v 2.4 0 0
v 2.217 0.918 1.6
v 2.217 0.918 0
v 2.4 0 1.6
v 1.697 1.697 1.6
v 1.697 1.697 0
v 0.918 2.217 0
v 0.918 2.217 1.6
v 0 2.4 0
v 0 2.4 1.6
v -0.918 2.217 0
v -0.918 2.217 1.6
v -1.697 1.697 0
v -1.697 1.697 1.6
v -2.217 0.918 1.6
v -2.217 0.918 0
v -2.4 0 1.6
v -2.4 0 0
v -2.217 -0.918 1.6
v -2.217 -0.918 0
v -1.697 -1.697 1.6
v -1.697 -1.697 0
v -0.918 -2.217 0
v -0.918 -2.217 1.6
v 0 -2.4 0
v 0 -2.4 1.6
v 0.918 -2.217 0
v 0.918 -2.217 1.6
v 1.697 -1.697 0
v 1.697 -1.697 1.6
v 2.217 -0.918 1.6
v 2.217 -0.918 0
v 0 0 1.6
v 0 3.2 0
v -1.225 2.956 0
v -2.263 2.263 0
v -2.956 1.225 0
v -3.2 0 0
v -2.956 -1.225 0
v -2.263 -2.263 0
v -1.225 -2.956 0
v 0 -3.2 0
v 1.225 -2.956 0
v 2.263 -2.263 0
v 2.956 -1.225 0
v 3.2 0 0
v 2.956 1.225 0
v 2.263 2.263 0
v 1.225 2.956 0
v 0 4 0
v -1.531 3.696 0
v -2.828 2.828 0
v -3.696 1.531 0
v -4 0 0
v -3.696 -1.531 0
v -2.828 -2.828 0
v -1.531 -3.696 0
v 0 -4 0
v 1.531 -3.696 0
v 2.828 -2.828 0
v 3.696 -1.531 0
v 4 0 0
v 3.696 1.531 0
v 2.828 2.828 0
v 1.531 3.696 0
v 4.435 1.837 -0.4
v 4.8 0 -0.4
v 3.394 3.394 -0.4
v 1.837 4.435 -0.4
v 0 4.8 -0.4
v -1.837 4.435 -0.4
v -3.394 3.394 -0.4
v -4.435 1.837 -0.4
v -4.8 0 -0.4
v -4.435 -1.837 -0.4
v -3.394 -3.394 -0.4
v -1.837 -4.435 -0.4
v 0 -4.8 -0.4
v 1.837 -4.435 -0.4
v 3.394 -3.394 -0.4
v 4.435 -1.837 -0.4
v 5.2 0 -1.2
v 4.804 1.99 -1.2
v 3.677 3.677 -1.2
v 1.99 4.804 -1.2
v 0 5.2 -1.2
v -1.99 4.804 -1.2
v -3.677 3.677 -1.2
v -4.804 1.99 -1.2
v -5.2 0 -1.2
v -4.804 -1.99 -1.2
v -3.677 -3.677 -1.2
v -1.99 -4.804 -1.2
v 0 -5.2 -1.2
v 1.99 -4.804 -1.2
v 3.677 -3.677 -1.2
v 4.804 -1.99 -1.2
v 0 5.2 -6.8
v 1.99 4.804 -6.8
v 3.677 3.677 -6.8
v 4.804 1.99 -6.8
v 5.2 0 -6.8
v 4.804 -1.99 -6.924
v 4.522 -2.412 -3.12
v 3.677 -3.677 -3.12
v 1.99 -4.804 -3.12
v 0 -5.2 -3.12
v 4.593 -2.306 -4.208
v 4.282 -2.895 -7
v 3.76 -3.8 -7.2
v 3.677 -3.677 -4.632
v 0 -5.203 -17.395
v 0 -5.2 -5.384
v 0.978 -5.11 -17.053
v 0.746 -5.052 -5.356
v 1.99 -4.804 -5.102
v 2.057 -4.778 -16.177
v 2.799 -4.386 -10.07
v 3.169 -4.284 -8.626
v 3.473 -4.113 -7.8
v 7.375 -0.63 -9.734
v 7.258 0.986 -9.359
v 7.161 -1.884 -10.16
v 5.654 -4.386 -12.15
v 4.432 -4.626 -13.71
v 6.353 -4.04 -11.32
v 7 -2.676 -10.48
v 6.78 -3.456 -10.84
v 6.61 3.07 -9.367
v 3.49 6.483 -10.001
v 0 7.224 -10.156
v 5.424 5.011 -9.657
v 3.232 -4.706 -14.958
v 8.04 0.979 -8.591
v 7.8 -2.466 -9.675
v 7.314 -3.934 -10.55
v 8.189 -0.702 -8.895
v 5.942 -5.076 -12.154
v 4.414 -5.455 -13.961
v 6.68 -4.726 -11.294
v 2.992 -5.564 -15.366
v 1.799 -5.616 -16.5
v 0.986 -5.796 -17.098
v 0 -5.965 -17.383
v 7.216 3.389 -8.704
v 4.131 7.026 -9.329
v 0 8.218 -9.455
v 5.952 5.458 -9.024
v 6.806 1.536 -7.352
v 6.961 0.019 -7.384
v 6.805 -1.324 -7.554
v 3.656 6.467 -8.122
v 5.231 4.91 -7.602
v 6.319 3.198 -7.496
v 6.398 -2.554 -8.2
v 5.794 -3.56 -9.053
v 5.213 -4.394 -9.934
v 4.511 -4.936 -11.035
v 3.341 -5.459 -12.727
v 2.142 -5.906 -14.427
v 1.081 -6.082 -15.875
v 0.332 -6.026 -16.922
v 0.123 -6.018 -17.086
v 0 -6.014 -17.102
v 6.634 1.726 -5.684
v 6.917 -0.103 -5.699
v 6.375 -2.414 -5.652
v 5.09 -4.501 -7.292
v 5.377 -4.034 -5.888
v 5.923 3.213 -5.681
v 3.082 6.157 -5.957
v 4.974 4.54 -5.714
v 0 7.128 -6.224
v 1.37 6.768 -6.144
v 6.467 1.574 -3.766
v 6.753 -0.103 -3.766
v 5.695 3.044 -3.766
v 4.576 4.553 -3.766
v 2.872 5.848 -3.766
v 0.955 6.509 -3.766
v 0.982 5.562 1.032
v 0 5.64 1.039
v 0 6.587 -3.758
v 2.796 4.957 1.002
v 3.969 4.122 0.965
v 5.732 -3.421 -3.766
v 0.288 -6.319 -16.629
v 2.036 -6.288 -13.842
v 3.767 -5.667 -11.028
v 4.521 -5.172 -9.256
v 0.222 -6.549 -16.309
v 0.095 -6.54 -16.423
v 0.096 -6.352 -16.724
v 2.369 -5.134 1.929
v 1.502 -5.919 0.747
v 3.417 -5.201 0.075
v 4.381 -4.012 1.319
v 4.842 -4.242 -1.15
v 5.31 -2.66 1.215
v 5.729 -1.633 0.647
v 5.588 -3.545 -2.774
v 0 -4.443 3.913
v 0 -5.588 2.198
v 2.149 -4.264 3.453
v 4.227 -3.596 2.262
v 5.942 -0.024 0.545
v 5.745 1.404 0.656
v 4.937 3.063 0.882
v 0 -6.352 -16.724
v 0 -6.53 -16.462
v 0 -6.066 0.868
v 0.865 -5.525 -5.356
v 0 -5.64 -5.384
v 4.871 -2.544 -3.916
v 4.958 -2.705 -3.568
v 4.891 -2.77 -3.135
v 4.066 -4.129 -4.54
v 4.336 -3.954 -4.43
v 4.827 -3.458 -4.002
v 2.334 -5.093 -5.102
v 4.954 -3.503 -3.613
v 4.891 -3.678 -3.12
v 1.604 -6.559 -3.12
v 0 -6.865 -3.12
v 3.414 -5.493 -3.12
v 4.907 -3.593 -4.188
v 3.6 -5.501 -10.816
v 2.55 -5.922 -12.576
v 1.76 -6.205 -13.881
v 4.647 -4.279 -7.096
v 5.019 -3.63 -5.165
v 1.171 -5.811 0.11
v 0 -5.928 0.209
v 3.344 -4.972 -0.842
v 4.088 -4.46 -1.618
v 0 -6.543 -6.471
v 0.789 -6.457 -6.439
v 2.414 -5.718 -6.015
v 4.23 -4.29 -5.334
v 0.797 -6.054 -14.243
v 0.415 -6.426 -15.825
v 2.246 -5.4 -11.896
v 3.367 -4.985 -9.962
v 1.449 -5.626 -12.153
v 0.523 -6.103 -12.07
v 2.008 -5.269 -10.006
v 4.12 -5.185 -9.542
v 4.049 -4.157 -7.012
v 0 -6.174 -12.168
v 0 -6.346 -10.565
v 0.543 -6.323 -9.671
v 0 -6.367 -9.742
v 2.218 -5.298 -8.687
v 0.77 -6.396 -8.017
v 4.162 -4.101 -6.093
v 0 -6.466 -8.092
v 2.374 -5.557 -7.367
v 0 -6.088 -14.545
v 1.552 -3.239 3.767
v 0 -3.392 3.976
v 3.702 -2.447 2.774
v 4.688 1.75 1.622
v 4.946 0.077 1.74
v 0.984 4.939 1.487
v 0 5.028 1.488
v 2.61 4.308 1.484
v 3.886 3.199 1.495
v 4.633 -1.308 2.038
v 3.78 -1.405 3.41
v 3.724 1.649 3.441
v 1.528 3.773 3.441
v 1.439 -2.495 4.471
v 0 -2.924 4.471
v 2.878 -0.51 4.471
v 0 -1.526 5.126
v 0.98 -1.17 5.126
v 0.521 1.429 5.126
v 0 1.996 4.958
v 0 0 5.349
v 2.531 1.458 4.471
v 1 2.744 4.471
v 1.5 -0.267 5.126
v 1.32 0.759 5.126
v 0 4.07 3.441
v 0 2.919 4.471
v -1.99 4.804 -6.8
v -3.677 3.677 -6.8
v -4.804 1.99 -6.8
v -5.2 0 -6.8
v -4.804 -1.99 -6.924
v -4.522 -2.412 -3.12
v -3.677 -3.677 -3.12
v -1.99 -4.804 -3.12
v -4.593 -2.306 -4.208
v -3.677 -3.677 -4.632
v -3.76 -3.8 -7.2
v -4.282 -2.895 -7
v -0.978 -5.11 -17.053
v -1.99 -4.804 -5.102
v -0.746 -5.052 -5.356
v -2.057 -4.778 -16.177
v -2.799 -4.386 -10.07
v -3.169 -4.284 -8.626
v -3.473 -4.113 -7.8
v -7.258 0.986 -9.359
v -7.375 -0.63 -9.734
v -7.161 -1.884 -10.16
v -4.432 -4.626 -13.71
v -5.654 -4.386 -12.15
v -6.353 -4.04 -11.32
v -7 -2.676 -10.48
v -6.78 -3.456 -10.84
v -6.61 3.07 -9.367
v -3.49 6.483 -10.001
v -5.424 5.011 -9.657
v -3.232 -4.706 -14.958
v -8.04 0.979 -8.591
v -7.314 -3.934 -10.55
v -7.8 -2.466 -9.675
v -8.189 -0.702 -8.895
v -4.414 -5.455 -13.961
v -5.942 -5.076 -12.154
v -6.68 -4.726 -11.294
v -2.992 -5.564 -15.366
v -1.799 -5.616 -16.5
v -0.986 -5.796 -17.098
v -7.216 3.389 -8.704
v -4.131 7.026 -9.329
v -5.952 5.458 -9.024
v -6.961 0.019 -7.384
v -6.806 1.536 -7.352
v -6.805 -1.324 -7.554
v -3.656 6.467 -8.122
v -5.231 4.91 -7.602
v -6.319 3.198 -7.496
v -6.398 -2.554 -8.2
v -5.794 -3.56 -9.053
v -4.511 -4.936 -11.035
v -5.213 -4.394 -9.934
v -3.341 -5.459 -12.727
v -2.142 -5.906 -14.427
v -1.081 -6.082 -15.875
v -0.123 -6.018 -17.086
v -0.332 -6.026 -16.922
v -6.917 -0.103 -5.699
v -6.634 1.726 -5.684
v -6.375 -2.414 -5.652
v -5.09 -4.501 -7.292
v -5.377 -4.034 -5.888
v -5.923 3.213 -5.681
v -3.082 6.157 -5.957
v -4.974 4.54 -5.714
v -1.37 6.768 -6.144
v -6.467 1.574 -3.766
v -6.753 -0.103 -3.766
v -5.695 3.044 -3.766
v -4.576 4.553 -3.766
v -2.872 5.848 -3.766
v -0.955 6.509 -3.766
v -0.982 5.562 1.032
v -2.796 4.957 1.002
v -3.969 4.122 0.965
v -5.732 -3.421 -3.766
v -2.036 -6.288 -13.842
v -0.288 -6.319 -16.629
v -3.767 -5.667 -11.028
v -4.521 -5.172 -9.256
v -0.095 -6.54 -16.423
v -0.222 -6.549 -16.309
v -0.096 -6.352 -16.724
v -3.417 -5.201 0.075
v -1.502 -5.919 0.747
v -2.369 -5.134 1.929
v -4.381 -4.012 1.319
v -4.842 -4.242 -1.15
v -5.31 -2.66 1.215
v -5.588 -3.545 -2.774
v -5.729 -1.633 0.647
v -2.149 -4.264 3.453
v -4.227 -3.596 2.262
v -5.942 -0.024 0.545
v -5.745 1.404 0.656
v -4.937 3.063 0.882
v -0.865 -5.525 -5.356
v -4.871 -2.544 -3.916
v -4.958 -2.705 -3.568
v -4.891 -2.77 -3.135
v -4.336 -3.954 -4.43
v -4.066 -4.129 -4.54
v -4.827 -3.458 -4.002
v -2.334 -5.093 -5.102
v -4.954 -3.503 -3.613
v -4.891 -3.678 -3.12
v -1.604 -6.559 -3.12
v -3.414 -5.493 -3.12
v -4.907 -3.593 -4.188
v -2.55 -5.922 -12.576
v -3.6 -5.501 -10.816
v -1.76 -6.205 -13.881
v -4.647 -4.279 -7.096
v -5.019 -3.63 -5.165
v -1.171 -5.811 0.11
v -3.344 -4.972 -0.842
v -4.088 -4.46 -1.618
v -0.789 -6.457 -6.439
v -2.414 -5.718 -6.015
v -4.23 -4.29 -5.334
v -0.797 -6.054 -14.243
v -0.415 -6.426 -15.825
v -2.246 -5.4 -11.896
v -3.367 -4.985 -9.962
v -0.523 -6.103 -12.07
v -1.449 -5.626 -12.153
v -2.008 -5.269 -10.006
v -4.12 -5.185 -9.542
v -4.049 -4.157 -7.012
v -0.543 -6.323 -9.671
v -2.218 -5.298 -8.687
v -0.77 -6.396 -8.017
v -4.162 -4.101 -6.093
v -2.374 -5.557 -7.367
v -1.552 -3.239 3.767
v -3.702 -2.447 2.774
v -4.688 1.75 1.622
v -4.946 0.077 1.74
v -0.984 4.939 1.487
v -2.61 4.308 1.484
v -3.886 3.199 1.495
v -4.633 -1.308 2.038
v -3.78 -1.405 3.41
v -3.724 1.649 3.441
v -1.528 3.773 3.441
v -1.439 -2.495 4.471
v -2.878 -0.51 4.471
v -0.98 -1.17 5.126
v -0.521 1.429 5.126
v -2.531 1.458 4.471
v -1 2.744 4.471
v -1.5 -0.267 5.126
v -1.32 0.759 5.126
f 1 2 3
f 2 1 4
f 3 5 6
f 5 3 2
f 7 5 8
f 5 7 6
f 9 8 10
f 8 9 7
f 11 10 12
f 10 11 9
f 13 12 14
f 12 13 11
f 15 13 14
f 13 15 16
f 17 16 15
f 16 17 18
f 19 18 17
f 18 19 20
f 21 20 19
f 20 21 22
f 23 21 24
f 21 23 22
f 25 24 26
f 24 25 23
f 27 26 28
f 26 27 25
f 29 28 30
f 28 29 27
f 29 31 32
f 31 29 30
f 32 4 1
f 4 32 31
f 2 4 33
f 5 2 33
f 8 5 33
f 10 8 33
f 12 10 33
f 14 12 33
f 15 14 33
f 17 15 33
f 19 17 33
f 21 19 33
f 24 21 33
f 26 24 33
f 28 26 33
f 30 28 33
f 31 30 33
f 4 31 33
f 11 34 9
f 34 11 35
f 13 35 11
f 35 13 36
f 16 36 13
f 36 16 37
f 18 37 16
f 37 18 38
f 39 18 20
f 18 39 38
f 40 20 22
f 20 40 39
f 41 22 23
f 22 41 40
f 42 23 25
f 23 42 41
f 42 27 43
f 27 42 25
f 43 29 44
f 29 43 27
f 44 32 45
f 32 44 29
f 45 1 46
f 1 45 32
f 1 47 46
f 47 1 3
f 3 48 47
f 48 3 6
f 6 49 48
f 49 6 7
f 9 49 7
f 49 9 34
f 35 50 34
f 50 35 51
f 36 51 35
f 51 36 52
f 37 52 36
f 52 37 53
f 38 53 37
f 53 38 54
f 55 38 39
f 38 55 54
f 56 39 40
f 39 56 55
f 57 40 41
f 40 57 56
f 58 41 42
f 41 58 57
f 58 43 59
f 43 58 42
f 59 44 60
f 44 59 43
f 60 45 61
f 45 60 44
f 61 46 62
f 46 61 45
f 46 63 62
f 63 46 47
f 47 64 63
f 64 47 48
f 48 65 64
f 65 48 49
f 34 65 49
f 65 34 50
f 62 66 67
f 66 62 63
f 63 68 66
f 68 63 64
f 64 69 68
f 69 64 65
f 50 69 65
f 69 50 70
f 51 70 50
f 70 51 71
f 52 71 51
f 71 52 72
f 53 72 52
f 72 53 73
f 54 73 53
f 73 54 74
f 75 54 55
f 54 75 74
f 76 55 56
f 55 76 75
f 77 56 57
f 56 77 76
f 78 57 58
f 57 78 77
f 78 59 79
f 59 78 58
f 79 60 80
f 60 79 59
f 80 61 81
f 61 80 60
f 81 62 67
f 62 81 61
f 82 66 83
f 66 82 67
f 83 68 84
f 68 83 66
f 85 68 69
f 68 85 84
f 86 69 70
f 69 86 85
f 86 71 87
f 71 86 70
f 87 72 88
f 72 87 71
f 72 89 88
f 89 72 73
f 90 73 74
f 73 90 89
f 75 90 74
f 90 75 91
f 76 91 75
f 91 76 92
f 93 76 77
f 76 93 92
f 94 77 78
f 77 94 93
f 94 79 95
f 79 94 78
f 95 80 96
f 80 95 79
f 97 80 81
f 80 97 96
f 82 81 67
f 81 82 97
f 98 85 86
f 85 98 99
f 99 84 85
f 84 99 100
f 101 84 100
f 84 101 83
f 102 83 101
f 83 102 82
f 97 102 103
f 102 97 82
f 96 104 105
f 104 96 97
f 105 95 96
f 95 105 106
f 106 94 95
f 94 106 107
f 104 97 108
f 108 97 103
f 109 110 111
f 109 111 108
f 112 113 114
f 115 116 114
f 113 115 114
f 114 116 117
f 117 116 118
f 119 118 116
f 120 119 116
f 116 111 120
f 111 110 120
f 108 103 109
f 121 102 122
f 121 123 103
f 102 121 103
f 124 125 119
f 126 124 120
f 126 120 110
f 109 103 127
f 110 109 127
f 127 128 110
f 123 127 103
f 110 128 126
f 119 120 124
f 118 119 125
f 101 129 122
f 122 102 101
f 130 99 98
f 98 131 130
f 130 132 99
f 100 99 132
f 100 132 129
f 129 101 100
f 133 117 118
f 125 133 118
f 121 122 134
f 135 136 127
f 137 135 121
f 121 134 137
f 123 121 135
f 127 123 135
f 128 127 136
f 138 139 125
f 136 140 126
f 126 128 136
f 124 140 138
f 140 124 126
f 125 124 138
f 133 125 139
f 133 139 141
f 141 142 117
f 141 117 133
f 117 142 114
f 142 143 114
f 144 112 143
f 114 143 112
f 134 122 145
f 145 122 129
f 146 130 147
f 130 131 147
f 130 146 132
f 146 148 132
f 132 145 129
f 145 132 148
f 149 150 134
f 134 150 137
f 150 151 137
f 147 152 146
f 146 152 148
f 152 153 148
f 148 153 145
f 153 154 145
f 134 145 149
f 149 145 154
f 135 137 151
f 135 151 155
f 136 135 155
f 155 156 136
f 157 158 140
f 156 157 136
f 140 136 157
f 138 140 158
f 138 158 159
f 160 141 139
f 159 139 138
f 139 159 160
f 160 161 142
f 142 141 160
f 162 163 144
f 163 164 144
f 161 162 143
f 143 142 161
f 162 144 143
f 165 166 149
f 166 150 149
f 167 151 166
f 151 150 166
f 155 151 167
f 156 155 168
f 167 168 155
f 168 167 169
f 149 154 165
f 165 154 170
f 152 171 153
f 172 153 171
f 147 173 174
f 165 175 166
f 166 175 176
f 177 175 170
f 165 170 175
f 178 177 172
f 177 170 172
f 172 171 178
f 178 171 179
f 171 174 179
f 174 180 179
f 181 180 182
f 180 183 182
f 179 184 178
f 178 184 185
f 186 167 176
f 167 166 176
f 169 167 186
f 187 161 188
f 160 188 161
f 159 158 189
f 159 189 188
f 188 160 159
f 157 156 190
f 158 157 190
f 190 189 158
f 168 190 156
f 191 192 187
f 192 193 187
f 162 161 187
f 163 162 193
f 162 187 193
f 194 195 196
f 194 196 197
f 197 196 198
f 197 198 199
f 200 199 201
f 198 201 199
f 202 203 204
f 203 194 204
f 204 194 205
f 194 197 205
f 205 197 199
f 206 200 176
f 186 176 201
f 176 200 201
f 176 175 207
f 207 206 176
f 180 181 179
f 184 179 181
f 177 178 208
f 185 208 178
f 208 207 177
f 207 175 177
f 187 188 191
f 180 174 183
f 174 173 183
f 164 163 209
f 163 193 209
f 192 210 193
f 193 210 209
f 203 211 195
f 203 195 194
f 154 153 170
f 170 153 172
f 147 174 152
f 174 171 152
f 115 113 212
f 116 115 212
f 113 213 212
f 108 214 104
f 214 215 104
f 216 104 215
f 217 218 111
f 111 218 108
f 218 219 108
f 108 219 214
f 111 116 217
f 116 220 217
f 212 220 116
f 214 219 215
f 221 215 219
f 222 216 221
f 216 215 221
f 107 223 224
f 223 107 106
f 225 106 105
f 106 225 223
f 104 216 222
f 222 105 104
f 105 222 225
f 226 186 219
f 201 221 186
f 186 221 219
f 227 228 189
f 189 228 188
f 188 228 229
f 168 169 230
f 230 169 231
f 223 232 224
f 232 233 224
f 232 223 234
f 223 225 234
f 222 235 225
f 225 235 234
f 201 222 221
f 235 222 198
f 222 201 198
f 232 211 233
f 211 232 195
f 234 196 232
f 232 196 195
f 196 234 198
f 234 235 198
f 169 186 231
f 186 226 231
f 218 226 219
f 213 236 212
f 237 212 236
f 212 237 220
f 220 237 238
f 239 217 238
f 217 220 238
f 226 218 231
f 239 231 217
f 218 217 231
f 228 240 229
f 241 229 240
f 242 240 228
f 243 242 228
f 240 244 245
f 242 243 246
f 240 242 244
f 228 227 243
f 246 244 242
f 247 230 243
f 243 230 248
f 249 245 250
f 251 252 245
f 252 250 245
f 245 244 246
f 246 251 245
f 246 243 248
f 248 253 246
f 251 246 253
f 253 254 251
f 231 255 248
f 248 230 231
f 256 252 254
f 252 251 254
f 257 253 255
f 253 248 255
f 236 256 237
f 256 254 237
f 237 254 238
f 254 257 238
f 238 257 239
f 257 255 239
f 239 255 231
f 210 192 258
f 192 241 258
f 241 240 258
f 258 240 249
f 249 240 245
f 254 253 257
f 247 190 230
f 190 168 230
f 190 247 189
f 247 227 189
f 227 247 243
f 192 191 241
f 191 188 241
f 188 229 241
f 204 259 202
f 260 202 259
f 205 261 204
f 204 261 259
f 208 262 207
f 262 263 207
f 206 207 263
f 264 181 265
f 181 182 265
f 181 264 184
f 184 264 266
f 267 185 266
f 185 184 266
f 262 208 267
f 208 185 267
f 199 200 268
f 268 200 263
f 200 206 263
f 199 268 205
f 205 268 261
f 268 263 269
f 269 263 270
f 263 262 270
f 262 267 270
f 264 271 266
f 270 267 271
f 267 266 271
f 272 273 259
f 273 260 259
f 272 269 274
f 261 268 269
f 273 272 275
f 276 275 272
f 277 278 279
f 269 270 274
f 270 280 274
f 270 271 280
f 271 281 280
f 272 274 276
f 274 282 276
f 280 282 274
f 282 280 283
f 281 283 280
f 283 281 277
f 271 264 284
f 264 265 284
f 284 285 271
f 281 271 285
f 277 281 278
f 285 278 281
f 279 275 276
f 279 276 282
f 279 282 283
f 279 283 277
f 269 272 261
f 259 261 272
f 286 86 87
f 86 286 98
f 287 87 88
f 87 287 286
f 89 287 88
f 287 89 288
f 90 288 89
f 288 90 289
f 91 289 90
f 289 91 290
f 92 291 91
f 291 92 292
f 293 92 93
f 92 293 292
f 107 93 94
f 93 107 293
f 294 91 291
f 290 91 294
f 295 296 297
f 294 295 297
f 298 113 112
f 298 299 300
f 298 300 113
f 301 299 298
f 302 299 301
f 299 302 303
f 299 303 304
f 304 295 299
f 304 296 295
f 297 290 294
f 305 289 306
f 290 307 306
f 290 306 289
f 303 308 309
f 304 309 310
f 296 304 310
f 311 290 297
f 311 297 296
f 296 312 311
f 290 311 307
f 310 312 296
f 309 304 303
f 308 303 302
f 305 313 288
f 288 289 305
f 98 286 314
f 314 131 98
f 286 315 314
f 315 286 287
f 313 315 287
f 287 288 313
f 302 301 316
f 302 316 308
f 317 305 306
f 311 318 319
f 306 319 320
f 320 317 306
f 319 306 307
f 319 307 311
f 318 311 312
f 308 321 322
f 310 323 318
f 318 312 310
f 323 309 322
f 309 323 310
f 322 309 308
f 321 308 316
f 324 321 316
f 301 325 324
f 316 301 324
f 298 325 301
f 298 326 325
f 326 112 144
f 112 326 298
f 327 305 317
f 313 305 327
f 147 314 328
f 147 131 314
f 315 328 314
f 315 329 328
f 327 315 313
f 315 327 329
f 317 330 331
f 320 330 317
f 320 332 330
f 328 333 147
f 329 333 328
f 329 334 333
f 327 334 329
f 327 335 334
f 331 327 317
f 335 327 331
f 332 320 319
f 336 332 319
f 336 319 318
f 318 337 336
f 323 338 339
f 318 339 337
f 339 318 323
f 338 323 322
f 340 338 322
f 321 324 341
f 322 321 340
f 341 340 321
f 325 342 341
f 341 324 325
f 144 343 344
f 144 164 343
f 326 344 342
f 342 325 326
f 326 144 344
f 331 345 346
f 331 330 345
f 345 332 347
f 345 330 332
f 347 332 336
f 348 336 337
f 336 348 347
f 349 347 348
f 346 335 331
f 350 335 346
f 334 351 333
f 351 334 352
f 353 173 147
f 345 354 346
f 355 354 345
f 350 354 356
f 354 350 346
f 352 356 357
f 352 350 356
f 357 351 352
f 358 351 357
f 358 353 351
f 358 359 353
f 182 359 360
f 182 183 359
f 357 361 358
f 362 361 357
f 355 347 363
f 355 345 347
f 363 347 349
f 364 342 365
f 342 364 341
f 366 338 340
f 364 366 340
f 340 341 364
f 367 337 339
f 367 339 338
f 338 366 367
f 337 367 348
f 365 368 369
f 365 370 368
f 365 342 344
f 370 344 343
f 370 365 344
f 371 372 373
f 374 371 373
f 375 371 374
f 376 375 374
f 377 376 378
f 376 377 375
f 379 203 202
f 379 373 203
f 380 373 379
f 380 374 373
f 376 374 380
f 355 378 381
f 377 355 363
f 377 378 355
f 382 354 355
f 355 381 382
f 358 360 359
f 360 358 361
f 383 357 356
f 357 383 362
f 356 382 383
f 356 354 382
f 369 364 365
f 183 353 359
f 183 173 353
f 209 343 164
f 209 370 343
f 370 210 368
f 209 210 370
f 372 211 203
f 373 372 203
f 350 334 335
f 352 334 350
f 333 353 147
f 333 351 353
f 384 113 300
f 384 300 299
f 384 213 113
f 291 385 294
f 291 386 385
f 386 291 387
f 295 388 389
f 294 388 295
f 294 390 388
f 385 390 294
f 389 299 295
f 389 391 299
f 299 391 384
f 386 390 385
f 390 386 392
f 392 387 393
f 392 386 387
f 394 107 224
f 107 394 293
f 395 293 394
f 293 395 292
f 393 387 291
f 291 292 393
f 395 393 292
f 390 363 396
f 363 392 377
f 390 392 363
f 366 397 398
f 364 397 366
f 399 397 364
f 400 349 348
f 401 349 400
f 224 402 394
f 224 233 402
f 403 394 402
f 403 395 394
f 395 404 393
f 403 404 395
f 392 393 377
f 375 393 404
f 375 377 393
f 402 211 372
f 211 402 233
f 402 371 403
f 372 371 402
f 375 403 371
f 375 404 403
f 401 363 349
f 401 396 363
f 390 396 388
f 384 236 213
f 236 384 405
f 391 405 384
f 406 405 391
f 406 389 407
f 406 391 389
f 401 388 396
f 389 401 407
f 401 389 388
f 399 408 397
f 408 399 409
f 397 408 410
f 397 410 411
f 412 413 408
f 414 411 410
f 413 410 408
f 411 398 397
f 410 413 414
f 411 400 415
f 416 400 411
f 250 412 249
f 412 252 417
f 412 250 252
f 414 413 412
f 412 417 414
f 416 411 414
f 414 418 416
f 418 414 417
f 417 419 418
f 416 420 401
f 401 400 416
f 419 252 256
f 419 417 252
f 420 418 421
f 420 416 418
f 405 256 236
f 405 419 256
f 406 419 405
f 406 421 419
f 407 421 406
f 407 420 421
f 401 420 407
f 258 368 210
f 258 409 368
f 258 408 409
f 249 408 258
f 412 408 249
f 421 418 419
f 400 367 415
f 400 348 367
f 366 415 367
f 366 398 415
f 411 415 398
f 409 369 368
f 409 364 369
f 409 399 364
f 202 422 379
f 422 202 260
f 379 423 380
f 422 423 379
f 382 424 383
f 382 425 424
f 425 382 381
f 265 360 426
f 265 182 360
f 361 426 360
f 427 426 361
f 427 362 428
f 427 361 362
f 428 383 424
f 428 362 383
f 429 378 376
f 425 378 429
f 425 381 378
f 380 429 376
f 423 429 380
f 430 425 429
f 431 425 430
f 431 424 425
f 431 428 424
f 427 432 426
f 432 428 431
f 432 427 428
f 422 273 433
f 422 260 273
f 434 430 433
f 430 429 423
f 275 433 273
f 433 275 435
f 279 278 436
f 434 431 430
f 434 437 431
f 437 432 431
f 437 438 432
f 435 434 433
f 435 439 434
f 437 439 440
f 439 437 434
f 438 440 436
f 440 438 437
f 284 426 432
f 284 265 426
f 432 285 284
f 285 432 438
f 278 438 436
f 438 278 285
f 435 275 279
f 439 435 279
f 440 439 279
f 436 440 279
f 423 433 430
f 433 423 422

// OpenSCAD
use <../lib.scad>
use <../p/4-4con12.scad>
use <../p/4-4con5.scad>
use <../p/4-4cylo.scad>
use <../p/4-4disc.scad>
use <../p/4-4ring3.scad>
use <../p/4-4ring4.scad>
use <s/30561s01.scad>
function ldraw_lib__30561() = [
// 0 Minifig Headdress SW Royal Guard
// 0 Name: 30561.dat
// 0 Author: Stan Isachenko [angmarec]
// 0 !LDRAW_ORG Part UPDATE 2022-04
// 0 !LICENSE Licensed under CC BY 2.0 and CC BY 4.0 : see CAreadme.txt
// 
// 0 BFC CERTIFY CCW
  [0,"BFC","CERTIFY"],
  [0,"BFC","CCW"],
// 
// 0 !CATEGORY Minifig Headwear
// 0 !KEYWORDS Niqab, Star Wars
// 
// 0 !HISTORY 2011-10-26 {LEGO Digital Designer} Original part shape
// 0 !HISTORY 2011-10-26 [angmarec] File preparation for LDraw Parts Tracker
// 0 !HISTORY 2020-04-07 [GeraldLasser] Corrected Intersection with Torso
// 0 !HISTORY 2021-02-20 [Holly-Wood] Decolored, closed gaps, added conds, smoothed mesh
// 0 !HISTORY 2022-07-18 [PTadmin] Official Update 2022-04
// 
// 
// 0 BFC INVERTNEXT
  [0,"BFC","INVERTNEXT"],
// 1 16 0 -4 0 6 0 0 0 4 0 0 0 6 4-4cylo.dat
  [1,16,0,-4,0,6,0,0,0,4,0,0,0,6, ldraw_lib__4_4cylo()],
// 1 16 0 -4 0 6 0 0 0 -1 0 0 0 6 4-4disc.dat
  [1,16,0,-4,0,6,0,0,0,-1,0,0,0,6, ldraw_lib__4_4disc()],
// 1 16 0 0 0 2 0 0 0 -1 0 0 0 2 4-4ring3.dat
  [1,16,0,0,0,2,0,0,0,-1,0,0,0,2, ldraw_lib__4_4ring3()],
// 1 16 0 0 0 2 0 0 0 -1 0 0 0 2 4-4ring4.dat
  [1,16,0,0,0,2,0,0,0,-1,0,0,0,2, ldraw_lib__4_4ring4()],
// 0 BFC INVERTNEXT
  [0,"BFC","INVERTNEXT"],
// 1 16 0 1 0 2 0 0 0 -1 0 0 0 2 4-4con5.dat
  [1,16,0,1,0,2,0,0,0,-1,0,0,0,2, ldraw_lib__4_4con5()],
// 0 BFC INVERTNEXT
  [0,"BFC","INVERTNEXT"],
// 1 16 0 3 0 1 0 0 0 -2 0 0 0 1 4-4con12.dat
  [1,16,0,3,0,1,0,0,0,-2,0,0,0,1, ldraw_lib__4_4con12()],
// 
// 1 16 0 0 0 1 0 0 0 1 0 0 0 1 s\30561s01.dat
  [1,16,0,0,0,1,0,0,0,1,0,0,0,1, ldraw_lib__s__30561s01()],
// 1 16 0 0 0 -1 0 0 0 1 0 0 0 1 s\30561s01.dat
  [1,16,0,0,0,-1,0,0,0,1,0,0,0,1, ldraw_lib__s__30561s01()],
// 
// 0 // Condlines Seam
// 5 24 0 13.46 -13 0 13.46 -14.1 2.163 13.389 -13.812 -2.163 13.389 -13.812
  [5,24,0,13.46,-13,0,13.46,-14.1,2.163,13.389,-13.812,-2.163,13.389,-13.812],
// 5 24 0 36.362 -15.22 0 41.156 -16.324 .238 41.057 -16.349 -.238 41.057 -16.349
  [5,24,0,36.362,-15.22,0,41.156,-16.324,.238,41.057,-16.349,-.238,41.057,-16.349],
// 5 24 0 42.755 -15.036 0 43.458 -14.913 -.308 42.715 -15.044 .308 42.715 -15.044
  [5,24,0,42.755,-15.036,0,43.458,-14.913,-.308,42.715,-15.044,.308,42.715,-15.044],
// 5 24 0 30.421 -15.436 0 36.362 -15.22 1.993 35.607 -15.135 -1.993 35.607 -15.135
  [5,24,0,30.421,-15.436,0,36.362,-15.22,1.993,35.607,-15.135,-1.993,35.607,-15.135],
// 5 24 0 41.809 -15.88 0 42.755 -15.036 .308 42.715 -15.044 -.308 42.715 -15.044
  [5,24,0,41.809,-15.88,0,42.755,-15.036,.308,42.715,-15.044,-.308,42.715,-15.044],
// 5 24 0 13.46 -14.1 0 16.178 -16.358 2.163 13.389 -13.812 -2.163 13.389 -13.812
  [5,24,0,13.46,-14.1,0,16.178,-16.358,2.163,13.389,-13.812,-2.163,13.389,-13.812],
// 5 24 0 26.413 -15.864 0 30.421 -15.436 1.307 30.174 -15.257 -1.307 30.174 -15.257
  [5,24,0,26.413,-15.864,0,30.421,-15.436,1.307,30.174,-15.257,-1.307,30.174,-15.257],
// 5 24 0 43.458 -14.913 0 43.488 -13.007 -2.464 42.746 -14.489 2.464 42.746 -14.489
  [5,24,0,43.458,-14.913,0,43.488,-13.007,-2.464,42.746,-14.489,2.464,42.746,-14.489],
// 5 24 0 24.356 -15.917 0 26.413 -15.864 -1.307 30.174 -15.257 1.307 30.174 -15.257
  [5,24,0,24.356,-15.917,0,26.413,-15.864,-1.307,30.174,-15.257,1.307,30.174,-15.257],
// 5 24 0 16.178 -16.358 0 20.231 -16.165 1.973 16.098 -16.142 -1.973 16.098 -16.142
  [5,24,0,16.178,-16.358,0,20.231,-16.165,1.973,16.098,-16.142,-1.973,16.098,-16.142],
// 5 24 0 20.231 -16.165 0 24.356 -15.917 1.926 20.043 -15.989 -1.926 20.043 -15.989
  [5,24,0,20.231,-16.165,0,24.356,-15.917,1.926,20.043,-15.989,-1.926,20.043,-15.989],
// 5 24 0 43.488 -13.007 0 13.46 -13 -2.444 42.633 -12.775 2.444 42.633 -12.775
  [5,24,0,43.488,-13.007,0,13.46,-13,-2.444,42.633,-12.775,2.444,42.633,-12.775],
// 5 24 0 41.156 -16.324 0 41.809 -15.88 .239 41.811 -15.879 -.239 41.811 -15.879
  [5,24,0,41.156,-16.324,0,41.809,-15.88,.239,41.811,-15.879,-.239,41.811,-15.879],
// 
// 5 24 0 -.522 -14.819 0 7.8 -17.162 2.927 -.274 -14.528 -2.927 -.274 -14.528
  [5,24,0,-.522,-14.819,0,7.8,-17.162,2.927,-.274,-14.528,-2.927,-.274,-14.528],
// 5 24 0 -12.394 4.99 0 -13.372 0 1.303 -12.815 3.573 -1.303 -12.815 3.573
  [5,24,0,-12.394,4.99,0,-13.372,0,1.303,-12.815,3.573,-1.303,-12.815,3.573],
// 5 24 0 -12.815 -3.814 0 -11.178 -7.311 3.598 -11.178 -6.238 -3.598 -11.178 -6.238
  [5,24,0,-12.815,-3.814,0,-11.178,-7.311,3.598,-11.178,-6.238,-3.598,-11.178,-6.238],
// 5 24 0 -11.178 7.298 0 -12.394 4.99 -2.499 -11.178 6.859 2.499 -11.178 6.859
  [5,24,0,-11.178,7.298,0,-12.394,4.99,-2.499,-11.178,6.859,2.499,-11.178,6.859],
// 5 24 0 -2.17 -15.166 0 -.522 -14.819 -2.927 -.274 -14.528 2.927 -.274 -14.528
  [5,24,0,-2.17,-15.166,0,-.522,-14.819,-2.927,-.274,-14.528,2.927,-.274,-14.528],
// 5 24 0 -9.94 -8.481 0 -9.783 -11.108 -3.881 -9.417 -8.097 3.881 -9.417 -8.097
  [5,24,0,-9.94,-8.481,0,-9.783,-11.108,-3.881,-9.417,-8.097,3.881,-9.417,-8.097],
// 5 24 0 -9.783 -11.108 0 -5.496 -13.97 5.372 -8.632 -10.66 -5.372 -8.632 -10.66
  [5,24,0,-9.783,-11.108,0,-5.496,-13.97,5.372,-8.632,-10.66,-5.372,-8.632,-10.66],
// 5 24 0 -11.178 -7.311 0 -9.94 -8.481 3.881 -9.417 -8.097 -3.881 -9.417 -8.097
  [5,24,0,-11.178,-7.311,0,-9.94,-8.481,3.881,-9.417,-8.097,-3.881,-9.417,-8.097],
// 5 24 0 -8.602 10.174 0 -11.178 7.298 3.819 -8.602 9.433 -3.819 -8.602 9.433
  [5,24,0,-8.602,10.174,0,-11.178,7.298,3.819,-8.602,9.433,-3.819,-8.602,9.433],
// 5 24 0 -13.372 0 0 -12.815 -3.814 -2.449 -12.815 -2.925 2.449 -12.815 -2.925
  [5,24,0,-13.372,0,0,-12.815,-3.814,-2.449,-12.815,-2.925,2.449,-12.815,-2.925],
// 5 24 0 -3.72 12.571 0 -8.602 10.174 2.461 -3.717 12.347 -2.461 -3.717 12.347
  [5,24,0,-3.72,12.571,0,-8.602,10.174,2.461,-3.717,12.347,-2.461,-3.717,12.347],
// 5 24 0 -3.72 12.571 0 -2.598 14.1 2.455 -2.579 13.905 -2.455 -2.579 13.905
  [5,24,0,-3.72,12.571,0,-2.598,14.1,2.455,-2.579,13.905,-2.455,-2.579,13.905],
// 5 24 0 -2.598 14.1 0 9.396 16.468 2.387 9.416 16.273 -2.387 9.416 16.273
  [5,24,0,-2.598,14.1,0,9.396,16.468,2.387,9.416,16.273,-2.387,9.416,16.273],
// 
// 5 24 0 -5.496 -13.97 0 -2.17 -15.166 3.755 -1.868 -14.797 -3.755 -1.868 -14.797
  [5,24,0,-5.496,-13.97,0,-2.17,-15.166,3.755,-1.868,-14.797,-3.755,-1.868,-14.797],
// 5 24 0 7.8 -13 0 3 -13 4.975 3 -12.011 -4.975 3 -12.011
  [5,24,0,7.8,-13,0,3,-13,4.975,3,-12.011,-4.975,3,-12.011],
// 5 24 0 9.396 16.468 0 15.559 17.819 3.426 15.36 16.919 -3.426 15.36 16.919
  [5,24,0,9.396,16.468,0,15.559,17.819,3.426,15.36,16.919,-3.426,15.36,16.919],
// 5 24 0 23.638 20.544 0 15.559 17.819 9.141 20.306 16.167 -9.141 20.306 16.167
  [5,24,0,23.638,20.544,0,15.559,17.819,9.141,20.306,16.167,-9.141,20.306,16.167],
// 
// 5 24 0 17 13 0 25.391 18.06 -8.724 25.002 16.207 8.724 25.002 16.207
  [5,24,0,17,13,0,25.391,18.06,-8.724,25.002,16.207,8.724,25.002,16.207],
// 5 24 0 25.391 18.06 0 23.638 20.544 -8.724 25.002 16.207 8.724 25.002 16.207
  [5,24,0,25.391,18.06,0,23.638,20.544,-8.724,25.002,16.207,8.724,25.002,16.207],
// 5 24 0 17 13 0 3 13 -4.975 17 12.011 4.975 17 12.011
  [5,24,0,17,13,0,3,13,-4.975,17,12.011,4.975,17,12.011],
];
makepoly(ldraw_lib__30561(), line=0.2);
